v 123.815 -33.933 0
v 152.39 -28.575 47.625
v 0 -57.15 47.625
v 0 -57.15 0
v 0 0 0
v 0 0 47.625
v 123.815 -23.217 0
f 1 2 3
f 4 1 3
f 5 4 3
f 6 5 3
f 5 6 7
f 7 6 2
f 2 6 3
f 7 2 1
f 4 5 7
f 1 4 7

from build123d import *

# Parameters (mm, degrees)
F0_W     = 152.390406
F0_H     = 47.625
F1_DEPTH = 57.15
F3_DEPTH = 57.15
F5_DEPTH = 76.2
F6_DEPTH = 127
F8_DEPTH = 50.8


with BuildPart() as f1:
    # F0 (on Front) → F1 (new body)
    with BuildSketch(Plane.XZ):
        with Locations((76.195203, 23.8125)):
            Rectangle(F0_W, F0_H)
    extrude(amount=F1_DEPTH)

    # F2 (on face) → F3 (cut)
    with BuildSketch(Plane.XZ.offset(57.15)):
        Polygon((152.390406, 0), (152.390406, 47.625), (123.815406, 0), align=None)
    extrude(amount=-F3_DEPTH, mode=Mode.SUBTRACT)

    # F4 (on face) → F5 (join)
    with BuildSketch(Plane.XY.offset(47.625)):
        Polygon((0, 0), (152.390406, -28.575), (152.390406, 0), align=None)
    extrude(amount=F5_DEPTH)

    # F5_face (on face) → F6 (cut)
    with BuildSketch(Plane(origin=(101.593604, -9.525, 123.825), x_dir=(1, 0, 0), z_dir=(0, 0, 1))):
        Polygon((-101.593604, 9.525), (50.796802, -19.05), (50.796802, 9.525), align=None)
    extrude(amount=-F6_DEPTH, mode=Mode.SUBTRACT)

    # F7 (on face) → F8 (cut)
    with BuildSketch(Plane.XY.offset(47.625)):
        Polygon((152.390406, -57.15), (152.390406, -28.575), (0, -57.15), align=None)
    extrude(amount=-F8_DEPTH, mode=Mode.SUBTRACT)


solid = f1.part
